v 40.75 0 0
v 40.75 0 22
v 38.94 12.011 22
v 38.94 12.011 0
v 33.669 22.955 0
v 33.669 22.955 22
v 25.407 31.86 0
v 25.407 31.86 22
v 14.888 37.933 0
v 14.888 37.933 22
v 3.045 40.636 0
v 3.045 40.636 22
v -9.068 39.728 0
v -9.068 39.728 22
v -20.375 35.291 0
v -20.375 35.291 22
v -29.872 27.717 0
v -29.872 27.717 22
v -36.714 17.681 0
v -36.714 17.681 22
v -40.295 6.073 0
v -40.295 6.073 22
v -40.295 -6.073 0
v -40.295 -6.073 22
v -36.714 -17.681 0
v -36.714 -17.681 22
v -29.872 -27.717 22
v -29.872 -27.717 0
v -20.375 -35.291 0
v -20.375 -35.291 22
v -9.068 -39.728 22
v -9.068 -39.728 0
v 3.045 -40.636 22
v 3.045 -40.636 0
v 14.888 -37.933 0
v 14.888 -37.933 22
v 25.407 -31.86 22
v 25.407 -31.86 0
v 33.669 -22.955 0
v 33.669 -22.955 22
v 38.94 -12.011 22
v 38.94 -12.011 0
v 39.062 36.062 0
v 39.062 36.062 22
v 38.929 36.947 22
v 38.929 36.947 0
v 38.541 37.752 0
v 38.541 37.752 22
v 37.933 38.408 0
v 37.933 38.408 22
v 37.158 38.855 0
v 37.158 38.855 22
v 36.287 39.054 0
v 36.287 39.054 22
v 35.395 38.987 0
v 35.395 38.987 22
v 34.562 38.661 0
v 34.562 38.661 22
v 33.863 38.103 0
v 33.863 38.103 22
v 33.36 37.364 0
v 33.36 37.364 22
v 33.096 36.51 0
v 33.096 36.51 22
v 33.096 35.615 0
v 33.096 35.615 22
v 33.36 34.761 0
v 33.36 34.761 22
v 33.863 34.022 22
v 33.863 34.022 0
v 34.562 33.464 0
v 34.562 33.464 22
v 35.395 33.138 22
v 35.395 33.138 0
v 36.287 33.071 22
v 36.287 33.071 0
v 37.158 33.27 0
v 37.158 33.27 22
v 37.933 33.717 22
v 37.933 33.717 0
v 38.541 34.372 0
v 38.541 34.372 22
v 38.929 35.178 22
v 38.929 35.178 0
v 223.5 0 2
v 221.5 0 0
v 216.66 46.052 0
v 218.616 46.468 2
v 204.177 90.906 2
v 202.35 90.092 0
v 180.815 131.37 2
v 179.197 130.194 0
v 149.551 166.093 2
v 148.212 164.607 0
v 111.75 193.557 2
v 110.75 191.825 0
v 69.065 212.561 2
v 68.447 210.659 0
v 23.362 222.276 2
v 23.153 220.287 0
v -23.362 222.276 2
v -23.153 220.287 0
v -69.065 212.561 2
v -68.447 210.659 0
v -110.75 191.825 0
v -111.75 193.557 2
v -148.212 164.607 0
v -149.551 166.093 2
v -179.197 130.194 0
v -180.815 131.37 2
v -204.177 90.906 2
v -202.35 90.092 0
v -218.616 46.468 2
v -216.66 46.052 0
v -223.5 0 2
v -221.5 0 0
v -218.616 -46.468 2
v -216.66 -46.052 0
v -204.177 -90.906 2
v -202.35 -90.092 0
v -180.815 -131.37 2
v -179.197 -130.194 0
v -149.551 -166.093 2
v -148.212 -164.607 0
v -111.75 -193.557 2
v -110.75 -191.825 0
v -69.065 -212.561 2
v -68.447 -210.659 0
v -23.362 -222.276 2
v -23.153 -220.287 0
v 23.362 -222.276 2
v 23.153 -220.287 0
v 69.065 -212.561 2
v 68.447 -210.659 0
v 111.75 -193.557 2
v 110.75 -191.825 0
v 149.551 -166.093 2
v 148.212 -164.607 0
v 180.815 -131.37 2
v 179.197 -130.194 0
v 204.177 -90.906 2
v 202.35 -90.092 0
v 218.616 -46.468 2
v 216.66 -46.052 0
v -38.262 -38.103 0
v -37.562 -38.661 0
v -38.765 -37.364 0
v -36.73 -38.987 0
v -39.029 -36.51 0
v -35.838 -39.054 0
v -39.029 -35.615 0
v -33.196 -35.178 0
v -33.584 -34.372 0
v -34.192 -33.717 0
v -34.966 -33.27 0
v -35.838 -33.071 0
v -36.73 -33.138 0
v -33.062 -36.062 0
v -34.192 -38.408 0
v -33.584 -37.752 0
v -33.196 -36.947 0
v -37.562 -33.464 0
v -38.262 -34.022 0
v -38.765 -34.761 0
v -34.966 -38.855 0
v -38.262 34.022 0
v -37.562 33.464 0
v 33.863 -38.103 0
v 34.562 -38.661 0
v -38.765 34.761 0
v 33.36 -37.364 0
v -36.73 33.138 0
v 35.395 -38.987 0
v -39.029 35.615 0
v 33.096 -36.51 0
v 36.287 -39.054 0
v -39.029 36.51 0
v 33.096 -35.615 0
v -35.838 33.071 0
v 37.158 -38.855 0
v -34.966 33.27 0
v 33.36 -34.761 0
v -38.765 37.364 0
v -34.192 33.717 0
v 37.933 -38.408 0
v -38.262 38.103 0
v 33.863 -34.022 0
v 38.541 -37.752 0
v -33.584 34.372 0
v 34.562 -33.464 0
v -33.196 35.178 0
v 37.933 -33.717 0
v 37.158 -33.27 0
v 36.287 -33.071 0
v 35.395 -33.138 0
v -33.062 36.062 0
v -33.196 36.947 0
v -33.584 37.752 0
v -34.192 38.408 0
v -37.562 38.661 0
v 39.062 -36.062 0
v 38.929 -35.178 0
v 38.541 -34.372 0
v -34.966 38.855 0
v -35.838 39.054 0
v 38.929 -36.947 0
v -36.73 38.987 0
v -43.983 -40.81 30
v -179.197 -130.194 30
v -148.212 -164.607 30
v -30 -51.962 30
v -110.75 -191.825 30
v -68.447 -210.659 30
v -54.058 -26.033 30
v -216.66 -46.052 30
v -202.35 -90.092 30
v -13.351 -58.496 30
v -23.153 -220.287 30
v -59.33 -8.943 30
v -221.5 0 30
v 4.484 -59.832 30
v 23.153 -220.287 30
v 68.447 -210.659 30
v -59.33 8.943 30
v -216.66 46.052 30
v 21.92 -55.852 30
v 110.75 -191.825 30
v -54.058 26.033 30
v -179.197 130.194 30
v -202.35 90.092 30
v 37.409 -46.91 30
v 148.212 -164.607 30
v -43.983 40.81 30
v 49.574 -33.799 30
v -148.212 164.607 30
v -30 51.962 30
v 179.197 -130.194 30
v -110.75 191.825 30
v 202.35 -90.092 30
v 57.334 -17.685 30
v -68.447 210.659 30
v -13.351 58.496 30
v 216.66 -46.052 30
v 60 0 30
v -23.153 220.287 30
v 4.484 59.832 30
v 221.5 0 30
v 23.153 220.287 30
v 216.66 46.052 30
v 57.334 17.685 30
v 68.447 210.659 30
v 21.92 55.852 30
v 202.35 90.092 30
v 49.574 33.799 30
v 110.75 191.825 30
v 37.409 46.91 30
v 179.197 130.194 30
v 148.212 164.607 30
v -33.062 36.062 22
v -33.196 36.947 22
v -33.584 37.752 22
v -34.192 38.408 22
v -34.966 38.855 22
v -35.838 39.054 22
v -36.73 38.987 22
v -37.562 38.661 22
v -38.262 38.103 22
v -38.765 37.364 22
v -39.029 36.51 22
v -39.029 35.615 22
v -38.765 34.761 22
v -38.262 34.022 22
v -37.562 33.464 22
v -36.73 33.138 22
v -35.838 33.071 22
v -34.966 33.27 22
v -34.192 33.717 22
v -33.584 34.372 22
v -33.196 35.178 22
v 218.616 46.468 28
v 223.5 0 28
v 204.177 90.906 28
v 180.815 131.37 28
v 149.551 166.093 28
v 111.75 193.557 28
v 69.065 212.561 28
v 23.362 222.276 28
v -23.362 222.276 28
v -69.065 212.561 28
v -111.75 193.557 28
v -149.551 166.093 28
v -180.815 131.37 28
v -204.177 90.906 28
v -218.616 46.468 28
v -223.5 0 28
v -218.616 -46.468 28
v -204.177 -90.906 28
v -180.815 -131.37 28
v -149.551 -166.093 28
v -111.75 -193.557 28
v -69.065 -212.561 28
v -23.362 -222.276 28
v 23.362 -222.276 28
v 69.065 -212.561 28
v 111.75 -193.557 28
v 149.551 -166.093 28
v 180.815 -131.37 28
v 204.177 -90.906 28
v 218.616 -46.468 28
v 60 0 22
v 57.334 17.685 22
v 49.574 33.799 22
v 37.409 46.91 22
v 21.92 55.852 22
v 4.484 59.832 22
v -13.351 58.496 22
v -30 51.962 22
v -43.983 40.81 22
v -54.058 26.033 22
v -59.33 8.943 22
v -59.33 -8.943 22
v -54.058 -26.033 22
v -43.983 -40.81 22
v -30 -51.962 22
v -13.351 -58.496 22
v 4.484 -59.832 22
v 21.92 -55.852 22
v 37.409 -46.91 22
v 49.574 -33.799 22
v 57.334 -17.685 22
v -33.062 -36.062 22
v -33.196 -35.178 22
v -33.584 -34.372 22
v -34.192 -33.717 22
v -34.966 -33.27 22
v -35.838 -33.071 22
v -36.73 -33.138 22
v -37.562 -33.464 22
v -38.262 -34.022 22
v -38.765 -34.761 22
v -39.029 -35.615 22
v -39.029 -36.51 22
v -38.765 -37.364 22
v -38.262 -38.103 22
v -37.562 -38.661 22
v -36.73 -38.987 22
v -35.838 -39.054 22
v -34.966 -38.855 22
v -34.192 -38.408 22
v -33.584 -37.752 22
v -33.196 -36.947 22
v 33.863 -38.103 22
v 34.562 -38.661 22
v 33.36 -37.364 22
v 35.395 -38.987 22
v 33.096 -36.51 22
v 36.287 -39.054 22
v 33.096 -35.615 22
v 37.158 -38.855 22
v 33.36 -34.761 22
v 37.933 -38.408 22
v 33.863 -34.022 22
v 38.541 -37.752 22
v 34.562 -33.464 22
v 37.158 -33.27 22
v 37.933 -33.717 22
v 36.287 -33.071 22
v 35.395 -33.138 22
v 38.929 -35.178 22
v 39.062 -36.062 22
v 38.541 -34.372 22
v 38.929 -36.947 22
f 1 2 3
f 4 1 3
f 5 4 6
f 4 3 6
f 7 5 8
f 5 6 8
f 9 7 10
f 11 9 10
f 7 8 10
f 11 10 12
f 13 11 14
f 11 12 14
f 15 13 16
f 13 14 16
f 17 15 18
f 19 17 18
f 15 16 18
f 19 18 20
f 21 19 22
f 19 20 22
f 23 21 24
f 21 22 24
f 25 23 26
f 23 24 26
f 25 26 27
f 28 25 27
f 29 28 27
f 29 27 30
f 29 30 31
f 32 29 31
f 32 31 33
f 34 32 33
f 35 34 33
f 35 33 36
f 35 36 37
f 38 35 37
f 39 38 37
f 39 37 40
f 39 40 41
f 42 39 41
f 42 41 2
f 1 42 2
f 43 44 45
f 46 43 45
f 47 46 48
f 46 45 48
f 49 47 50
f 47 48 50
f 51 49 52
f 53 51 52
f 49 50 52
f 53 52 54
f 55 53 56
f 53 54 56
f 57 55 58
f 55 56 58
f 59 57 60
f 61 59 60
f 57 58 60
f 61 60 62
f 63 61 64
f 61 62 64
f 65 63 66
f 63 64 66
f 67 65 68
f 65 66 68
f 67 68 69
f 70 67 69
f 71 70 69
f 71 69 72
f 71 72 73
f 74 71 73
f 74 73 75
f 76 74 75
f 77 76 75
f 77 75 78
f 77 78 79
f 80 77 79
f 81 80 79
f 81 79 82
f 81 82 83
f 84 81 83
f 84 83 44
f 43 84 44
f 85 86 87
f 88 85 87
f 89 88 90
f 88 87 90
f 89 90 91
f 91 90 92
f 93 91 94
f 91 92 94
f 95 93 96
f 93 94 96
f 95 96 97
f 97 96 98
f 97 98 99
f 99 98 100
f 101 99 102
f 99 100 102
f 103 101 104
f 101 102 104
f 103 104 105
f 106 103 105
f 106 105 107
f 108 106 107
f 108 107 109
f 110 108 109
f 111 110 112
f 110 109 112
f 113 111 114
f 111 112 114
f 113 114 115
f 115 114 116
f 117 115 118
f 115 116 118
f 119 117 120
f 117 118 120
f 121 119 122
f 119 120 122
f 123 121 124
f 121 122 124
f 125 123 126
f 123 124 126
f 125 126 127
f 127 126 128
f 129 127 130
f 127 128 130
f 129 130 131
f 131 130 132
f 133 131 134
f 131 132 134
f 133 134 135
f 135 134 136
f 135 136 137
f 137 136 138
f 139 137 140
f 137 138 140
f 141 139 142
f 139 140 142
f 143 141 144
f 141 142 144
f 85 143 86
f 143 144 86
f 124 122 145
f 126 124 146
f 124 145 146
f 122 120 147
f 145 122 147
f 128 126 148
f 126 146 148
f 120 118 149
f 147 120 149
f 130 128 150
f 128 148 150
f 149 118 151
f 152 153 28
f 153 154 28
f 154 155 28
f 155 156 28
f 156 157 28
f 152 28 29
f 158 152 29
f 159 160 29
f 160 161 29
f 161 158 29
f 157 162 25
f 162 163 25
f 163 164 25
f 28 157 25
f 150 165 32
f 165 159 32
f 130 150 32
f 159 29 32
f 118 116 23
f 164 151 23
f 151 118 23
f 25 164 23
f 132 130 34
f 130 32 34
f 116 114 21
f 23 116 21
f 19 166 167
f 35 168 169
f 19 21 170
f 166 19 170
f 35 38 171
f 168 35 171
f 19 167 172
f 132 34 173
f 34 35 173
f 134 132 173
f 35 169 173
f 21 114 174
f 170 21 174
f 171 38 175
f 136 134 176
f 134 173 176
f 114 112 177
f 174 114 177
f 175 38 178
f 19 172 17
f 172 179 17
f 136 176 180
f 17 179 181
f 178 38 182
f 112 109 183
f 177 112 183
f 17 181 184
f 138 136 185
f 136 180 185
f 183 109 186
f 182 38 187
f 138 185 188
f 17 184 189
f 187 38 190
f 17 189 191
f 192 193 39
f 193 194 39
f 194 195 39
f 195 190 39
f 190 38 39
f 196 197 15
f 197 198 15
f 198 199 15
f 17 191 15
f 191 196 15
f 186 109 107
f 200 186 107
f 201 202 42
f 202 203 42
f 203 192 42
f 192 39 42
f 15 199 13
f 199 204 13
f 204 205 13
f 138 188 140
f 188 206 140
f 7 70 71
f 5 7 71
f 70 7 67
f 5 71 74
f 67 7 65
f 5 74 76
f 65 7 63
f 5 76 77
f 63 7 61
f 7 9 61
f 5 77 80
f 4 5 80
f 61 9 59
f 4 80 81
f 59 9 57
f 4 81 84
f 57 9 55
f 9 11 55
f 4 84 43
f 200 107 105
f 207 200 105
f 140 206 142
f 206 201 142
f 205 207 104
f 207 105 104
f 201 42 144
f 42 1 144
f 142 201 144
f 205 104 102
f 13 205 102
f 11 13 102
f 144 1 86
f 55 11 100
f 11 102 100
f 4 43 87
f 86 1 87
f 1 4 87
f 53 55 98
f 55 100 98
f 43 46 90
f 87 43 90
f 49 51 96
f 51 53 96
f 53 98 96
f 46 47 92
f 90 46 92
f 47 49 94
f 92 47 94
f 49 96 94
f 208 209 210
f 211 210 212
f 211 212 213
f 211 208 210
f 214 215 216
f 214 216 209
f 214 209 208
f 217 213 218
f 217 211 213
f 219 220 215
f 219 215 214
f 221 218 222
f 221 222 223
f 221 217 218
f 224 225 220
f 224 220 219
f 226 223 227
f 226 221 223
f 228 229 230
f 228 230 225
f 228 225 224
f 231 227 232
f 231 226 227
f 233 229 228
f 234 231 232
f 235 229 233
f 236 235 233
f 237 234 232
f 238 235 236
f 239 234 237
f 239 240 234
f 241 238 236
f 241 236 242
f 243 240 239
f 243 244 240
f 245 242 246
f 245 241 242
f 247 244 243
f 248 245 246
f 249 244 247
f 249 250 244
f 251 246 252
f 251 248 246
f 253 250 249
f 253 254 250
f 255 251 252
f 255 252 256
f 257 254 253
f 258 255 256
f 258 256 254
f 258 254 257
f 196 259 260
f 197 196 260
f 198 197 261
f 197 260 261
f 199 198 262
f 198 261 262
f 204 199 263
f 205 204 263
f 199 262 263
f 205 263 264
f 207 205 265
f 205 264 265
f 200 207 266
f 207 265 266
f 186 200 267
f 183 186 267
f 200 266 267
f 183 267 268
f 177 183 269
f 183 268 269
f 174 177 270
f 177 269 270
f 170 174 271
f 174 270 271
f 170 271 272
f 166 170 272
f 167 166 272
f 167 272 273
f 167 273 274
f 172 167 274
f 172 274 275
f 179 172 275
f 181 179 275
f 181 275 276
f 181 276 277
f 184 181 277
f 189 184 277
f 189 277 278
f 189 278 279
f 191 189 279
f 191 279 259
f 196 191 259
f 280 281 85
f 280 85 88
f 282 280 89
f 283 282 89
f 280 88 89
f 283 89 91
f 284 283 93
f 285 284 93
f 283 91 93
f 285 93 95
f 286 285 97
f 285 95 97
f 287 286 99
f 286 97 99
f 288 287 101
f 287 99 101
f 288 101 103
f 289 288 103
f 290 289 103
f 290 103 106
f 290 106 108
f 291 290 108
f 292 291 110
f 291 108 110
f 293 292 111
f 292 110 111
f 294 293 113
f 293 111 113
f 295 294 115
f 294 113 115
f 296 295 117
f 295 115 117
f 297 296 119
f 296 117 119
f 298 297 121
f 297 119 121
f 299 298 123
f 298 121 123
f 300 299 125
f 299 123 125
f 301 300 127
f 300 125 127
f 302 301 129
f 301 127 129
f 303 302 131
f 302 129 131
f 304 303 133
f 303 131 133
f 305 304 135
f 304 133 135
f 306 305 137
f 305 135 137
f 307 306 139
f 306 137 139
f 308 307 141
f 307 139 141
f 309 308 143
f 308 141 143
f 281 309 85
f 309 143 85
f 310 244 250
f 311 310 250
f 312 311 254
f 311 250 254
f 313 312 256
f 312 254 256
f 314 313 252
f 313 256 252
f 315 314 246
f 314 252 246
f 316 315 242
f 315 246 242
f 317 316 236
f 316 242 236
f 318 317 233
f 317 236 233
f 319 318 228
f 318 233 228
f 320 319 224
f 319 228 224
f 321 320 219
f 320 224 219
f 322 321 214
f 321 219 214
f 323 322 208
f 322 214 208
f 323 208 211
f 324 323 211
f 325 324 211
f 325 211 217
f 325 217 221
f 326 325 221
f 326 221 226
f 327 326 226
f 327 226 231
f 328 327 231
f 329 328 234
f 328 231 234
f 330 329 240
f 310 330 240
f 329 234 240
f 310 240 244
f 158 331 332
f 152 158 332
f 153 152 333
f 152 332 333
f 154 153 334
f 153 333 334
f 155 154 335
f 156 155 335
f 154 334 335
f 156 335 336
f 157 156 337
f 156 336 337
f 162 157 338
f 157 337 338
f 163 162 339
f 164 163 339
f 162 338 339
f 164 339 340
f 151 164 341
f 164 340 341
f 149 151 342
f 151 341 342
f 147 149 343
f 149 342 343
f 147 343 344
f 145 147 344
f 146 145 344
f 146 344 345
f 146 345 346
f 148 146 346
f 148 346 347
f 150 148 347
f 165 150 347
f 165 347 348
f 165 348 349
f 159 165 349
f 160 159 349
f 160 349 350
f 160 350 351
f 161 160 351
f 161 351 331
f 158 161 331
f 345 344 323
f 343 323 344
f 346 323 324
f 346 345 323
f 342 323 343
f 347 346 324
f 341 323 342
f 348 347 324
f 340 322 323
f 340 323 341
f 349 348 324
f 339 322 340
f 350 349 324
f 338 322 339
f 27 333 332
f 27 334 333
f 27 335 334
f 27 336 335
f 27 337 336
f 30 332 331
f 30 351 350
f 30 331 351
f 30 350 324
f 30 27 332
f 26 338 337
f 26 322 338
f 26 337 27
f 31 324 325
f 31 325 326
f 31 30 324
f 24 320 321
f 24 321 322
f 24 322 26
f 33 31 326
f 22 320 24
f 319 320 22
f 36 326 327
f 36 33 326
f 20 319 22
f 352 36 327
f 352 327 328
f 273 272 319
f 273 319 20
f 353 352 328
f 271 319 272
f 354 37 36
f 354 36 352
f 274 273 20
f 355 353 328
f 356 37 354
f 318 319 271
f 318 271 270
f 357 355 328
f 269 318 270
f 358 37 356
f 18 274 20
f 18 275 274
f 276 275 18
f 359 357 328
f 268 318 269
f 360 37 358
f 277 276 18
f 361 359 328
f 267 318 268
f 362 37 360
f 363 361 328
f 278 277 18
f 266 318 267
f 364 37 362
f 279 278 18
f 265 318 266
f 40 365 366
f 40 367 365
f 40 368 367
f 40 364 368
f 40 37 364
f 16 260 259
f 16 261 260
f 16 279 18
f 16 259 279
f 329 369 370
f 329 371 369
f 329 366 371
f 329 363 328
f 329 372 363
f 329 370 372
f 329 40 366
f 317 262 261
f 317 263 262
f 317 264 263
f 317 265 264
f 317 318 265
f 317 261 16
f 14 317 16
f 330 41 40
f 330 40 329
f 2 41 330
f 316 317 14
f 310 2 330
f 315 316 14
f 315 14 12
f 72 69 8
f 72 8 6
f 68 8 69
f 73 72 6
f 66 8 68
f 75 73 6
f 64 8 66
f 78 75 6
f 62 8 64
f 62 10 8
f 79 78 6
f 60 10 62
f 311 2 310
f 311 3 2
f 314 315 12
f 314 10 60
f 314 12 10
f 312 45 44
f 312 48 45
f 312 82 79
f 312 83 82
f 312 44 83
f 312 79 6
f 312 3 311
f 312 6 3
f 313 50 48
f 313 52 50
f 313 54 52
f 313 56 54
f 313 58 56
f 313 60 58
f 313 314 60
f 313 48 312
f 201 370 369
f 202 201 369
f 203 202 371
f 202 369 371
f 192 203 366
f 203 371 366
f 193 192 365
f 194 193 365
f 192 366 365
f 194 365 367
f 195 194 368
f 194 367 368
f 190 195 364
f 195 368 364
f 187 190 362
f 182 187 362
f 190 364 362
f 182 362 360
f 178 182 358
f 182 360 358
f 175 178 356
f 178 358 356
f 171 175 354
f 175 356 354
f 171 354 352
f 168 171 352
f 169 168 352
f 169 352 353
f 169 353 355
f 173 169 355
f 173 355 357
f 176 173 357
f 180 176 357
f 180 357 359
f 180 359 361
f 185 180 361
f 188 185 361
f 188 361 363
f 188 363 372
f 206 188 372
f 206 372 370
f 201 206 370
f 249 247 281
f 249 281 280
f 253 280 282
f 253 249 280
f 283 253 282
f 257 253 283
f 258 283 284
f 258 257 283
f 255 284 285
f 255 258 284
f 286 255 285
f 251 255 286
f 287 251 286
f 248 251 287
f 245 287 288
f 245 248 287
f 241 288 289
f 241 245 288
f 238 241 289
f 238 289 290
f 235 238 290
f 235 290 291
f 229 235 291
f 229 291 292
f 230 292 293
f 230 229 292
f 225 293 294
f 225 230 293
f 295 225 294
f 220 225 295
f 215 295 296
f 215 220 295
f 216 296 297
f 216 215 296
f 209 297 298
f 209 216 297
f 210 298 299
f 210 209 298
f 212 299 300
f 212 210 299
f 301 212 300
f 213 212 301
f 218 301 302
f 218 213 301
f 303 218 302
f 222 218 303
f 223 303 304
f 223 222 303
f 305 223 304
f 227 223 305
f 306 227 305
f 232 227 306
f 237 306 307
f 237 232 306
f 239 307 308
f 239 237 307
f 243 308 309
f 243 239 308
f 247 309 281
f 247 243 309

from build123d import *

# Parameters (mm, degrees)
F0_R     = 223.5
F1_DEPTH = 30
F2_SIZE  = 2
F3_R     = 40.75
F4_DEPTH = 30
F3_R_2   = 60
F3_R_3   = 3
F5_DEPTH = 8
F6_DEPTH = 30.001


with BuildPart() as f1:
    # F0 (on Top) → F1 (new body)
    with BuildSketch(Plane.XY):
        Circle(F0_R)
    extrude(amount=F1_DEPTH)

    # F2
    f2_edges = [f1.edges().sort_by_distance(p)[0] for p in [
        (-223.5, 0, 30),
        (-223.5, 0, 0),
    ]]
    chamfer(f2_edges, length=F2_SIZE)

    # F3 (on face) → F4 (cut)
    with BuildSketch(Plane.XY.offset(30)):
        Circle(F3_R)
    extrude(amount=-F4_DEPTH, mode=Mode.SUBTRACT)

    # F3 (on face) → F5 (cut)
    with BuildSketch(Plane.XY.offset(30)):
        Circle(F3_R_2)
        with Locations((-36.062446, -36.062446)):
            Circle(F3_R_3, mode=Mode.SUBTRACT)
        Circle(F3_R, mode=Mode.SUBTRACT)
        with Locations((36.062446, -36.062446)):
            Circle(F3_R_3, mode=Mode.SUBTRACT)
        with Locations((-36.062446, 36.062446)):
            Circle(F3_R_3, mode=Mode.SUBTRACT)
        with Locations((36.062446, 36.062446)):
            Circle(F3_R_3, mode=Mode.SUBTRACT)
        with Locations((-36.062446, 36.062446)):
            Circle(F3_R_3)
        with Locations((36.062446, 36.062446)):
            Circle(F3_R_3)
        with Locations((36.062446, -36.062446)):
            Circle(F3_R_3)
        with Locations((-36.062446, -36.062446)):
            Circle(F3_R_3)
    extrude(amount=-F5_DEPTH, mode=Mode.SUBTRACT)

    # F3 (on face) → F6 (cut, through all)
    with BuildSketch(Plane.XY.offset(30)):
        with Locations((-36.062446, 36.062446)):
            Circle(F3_R_3)
        with Locations((36.062446, 36.062446)):
            Circle(F3_R_3)
        with Locations((36.062446, -36.062446)):
            Circle(F3_R_3)
        with Locations((-36.062446, -36.062446)):
            Circle(F3_R_3)
    extrude(amount=-F6_DEPTH, mode=Mode.SUBTRACT)


solid = f1.part
